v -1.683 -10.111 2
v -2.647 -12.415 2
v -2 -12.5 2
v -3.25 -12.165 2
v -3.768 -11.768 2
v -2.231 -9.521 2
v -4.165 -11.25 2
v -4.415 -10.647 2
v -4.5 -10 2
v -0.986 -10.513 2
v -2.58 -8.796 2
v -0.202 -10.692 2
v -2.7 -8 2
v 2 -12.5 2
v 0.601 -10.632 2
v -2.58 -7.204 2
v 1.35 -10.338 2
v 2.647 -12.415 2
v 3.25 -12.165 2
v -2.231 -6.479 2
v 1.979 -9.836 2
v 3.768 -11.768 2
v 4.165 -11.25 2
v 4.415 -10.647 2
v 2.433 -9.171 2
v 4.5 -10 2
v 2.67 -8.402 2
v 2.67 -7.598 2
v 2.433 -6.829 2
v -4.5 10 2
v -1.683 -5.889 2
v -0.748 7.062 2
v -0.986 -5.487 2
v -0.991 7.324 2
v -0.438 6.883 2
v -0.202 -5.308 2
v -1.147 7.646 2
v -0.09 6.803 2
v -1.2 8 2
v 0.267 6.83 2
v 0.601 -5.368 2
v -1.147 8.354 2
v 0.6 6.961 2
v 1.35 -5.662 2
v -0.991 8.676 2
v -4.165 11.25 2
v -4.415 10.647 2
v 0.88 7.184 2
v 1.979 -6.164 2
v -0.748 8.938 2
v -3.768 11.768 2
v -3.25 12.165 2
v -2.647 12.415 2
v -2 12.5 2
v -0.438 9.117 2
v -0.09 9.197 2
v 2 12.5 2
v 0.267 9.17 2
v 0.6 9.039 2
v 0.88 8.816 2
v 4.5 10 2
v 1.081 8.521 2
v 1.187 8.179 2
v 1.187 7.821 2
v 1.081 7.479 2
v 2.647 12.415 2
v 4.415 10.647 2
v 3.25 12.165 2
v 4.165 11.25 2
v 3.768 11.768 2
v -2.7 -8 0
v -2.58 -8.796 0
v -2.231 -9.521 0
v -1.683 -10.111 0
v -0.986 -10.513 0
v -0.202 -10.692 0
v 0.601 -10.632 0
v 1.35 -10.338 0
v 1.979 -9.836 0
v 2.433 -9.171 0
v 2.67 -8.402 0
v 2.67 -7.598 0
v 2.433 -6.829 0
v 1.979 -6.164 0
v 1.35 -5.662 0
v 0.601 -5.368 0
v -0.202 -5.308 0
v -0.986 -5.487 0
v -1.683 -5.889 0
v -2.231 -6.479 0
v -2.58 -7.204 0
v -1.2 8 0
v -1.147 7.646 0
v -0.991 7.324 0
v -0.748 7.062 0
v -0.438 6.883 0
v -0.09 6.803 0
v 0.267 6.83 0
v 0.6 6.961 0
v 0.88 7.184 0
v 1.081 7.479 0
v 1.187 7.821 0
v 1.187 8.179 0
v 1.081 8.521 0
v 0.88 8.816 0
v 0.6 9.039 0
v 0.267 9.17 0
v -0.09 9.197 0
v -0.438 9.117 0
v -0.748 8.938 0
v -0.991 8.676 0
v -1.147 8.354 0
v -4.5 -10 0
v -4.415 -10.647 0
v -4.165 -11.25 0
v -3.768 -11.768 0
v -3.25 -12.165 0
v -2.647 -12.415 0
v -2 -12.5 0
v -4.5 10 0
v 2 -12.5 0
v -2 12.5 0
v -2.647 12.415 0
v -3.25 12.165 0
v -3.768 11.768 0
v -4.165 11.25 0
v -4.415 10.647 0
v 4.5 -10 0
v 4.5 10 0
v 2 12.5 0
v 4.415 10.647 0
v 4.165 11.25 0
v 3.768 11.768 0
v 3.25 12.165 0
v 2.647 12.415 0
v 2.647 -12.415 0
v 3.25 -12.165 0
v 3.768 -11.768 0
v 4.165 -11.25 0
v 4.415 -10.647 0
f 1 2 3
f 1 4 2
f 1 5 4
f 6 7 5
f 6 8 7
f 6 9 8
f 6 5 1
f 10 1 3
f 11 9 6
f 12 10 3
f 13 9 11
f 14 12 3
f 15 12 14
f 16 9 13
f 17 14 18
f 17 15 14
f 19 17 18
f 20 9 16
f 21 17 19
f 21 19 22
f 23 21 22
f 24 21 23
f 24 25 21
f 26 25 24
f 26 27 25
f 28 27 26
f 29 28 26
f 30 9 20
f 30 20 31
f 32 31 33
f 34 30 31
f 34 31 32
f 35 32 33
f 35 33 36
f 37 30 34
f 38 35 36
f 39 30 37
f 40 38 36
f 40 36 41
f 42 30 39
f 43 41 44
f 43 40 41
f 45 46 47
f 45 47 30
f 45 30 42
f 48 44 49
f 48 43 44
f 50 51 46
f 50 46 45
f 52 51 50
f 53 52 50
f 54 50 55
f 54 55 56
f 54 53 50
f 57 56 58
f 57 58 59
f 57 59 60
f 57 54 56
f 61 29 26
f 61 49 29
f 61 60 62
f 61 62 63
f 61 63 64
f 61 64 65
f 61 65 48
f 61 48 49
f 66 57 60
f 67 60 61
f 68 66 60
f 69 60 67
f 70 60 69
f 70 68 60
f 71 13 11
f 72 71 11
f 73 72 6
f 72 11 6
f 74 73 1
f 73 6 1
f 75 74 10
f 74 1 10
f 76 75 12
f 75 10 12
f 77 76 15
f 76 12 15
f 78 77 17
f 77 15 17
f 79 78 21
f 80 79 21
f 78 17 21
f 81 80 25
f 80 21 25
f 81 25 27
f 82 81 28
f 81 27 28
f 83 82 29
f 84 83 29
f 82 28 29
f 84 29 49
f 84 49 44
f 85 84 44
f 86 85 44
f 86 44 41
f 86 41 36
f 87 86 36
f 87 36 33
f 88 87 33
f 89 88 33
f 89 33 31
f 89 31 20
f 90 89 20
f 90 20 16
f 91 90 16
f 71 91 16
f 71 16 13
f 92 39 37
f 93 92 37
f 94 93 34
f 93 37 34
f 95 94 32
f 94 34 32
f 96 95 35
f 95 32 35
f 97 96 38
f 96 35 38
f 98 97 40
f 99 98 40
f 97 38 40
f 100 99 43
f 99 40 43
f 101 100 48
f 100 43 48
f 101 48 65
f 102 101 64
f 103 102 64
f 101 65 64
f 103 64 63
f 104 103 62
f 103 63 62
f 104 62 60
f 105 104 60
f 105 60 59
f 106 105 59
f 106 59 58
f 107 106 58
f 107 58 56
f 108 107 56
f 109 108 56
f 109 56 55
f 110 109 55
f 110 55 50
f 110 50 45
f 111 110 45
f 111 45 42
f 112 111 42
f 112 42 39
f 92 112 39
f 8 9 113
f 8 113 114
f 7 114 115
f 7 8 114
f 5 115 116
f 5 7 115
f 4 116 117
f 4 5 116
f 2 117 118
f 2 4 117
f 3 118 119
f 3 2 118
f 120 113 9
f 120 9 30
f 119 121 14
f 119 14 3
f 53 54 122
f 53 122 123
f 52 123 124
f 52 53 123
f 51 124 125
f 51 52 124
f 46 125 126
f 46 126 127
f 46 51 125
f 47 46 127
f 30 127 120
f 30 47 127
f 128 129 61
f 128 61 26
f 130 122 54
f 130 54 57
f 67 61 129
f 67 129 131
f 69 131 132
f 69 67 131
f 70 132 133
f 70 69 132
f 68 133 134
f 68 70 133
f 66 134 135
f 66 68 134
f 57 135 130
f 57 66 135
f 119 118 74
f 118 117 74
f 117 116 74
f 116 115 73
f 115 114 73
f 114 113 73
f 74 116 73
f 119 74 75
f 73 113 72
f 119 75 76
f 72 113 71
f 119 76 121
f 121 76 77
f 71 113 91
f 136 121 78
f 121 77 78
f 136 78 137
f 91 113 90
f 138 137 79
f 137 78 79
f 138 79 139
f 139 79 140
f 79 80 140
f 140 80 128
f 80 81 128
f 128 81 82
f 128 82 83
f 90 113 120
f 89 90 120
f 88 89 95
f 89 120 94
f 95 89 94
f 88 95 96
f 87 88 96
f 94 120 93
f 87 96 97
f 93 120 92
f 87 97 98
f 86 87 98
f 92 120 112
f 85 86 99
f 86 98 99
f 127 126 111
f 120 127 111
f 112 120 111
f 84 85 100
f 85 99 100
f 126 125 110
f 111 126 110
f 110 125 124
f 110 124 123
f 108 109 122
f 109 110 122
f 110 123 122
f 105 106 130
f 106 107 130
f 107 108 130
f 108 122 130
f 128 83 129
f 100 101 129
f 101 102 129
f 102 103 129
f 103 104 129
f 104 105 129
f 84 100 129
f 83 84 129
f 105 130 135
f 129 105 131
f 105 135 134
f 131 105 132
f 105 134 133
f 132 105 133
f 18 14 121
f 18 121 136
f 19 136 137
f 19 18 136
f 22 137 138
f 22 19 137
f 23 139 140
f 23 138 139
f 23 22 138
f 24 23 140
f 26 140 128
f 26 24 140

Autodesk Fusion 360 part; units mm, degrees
sketch "Sketch1" plane through (0, 0, 0) normal (0, 0, 1) x (1, 0, 0)
  line L0 (-4.5, 12.5) -> (4.5, 12.5)
  line L1 (4.5, 12.5) -> (4.5, -12.5)
  line L2 (4.5, -12.5) -> (-4.5, -12.5)
  line L3 (-4.5, -12.5) -> (-4.5, 12.5)
  line L4 (-4.5, 12.5) -> (4.5, -12.5) construction
  line L5 (4.5, 12.5) -> (-4.5, -12.5) construction
  dimension "d1" = 9
  dimension "d2" = 25
extrude "Extrude1" add sketch "Sketch1" along normal blind 2
fillet "Fillet4" radius 2.5 4 edges at (4.5, 12.5, 1) (-4.5, 12.5, 1) (-4.5, -12.5, 1) (4.5, -12.5, 1)
sketch "Sketch7" plane through (0, 0, 2) normal (0, 0, 1) x (-1, 0, 0)
  arc A0 (-2, 12.5) -> (-4.5, 10) centre (-2, 10) ccw
  line L0 (-4.5, 10) -> (-4.5, -10)
  arc A1 (2, -12.5) -> (4.5, -10) centre (2, -10) ccw
  line L1 (4.5, -10) -> (4.5, 10)
  arc A2 (-4.5, -10) -> (-2, -12.5) centre (-2, -10) ccw
  line L2 (-2, -12.5) -> (2, -12.5)
  arc A3 (4.5, 10) -> (2, 12.5) centre (2, 10) ccw
  line L3 (2, 12.5) -> (-2, 12.5)
  line L4 (0, 12.5) -> (0, -12.5) construction
  line L5 (0, 12.5) -> (0, 8)
  line L6 (0, -12.5) -> (0, -8)
  circle A4 centre (0, -8) radius 1.2
  circle A5 centre (0, 8) radius 2.7
  dimension "d40" = 2.4
  dimension "d41" = 5.4
extrude "Extrude7" cut sketch "Sketch7" against normal blind 3 contours A4 | A5
